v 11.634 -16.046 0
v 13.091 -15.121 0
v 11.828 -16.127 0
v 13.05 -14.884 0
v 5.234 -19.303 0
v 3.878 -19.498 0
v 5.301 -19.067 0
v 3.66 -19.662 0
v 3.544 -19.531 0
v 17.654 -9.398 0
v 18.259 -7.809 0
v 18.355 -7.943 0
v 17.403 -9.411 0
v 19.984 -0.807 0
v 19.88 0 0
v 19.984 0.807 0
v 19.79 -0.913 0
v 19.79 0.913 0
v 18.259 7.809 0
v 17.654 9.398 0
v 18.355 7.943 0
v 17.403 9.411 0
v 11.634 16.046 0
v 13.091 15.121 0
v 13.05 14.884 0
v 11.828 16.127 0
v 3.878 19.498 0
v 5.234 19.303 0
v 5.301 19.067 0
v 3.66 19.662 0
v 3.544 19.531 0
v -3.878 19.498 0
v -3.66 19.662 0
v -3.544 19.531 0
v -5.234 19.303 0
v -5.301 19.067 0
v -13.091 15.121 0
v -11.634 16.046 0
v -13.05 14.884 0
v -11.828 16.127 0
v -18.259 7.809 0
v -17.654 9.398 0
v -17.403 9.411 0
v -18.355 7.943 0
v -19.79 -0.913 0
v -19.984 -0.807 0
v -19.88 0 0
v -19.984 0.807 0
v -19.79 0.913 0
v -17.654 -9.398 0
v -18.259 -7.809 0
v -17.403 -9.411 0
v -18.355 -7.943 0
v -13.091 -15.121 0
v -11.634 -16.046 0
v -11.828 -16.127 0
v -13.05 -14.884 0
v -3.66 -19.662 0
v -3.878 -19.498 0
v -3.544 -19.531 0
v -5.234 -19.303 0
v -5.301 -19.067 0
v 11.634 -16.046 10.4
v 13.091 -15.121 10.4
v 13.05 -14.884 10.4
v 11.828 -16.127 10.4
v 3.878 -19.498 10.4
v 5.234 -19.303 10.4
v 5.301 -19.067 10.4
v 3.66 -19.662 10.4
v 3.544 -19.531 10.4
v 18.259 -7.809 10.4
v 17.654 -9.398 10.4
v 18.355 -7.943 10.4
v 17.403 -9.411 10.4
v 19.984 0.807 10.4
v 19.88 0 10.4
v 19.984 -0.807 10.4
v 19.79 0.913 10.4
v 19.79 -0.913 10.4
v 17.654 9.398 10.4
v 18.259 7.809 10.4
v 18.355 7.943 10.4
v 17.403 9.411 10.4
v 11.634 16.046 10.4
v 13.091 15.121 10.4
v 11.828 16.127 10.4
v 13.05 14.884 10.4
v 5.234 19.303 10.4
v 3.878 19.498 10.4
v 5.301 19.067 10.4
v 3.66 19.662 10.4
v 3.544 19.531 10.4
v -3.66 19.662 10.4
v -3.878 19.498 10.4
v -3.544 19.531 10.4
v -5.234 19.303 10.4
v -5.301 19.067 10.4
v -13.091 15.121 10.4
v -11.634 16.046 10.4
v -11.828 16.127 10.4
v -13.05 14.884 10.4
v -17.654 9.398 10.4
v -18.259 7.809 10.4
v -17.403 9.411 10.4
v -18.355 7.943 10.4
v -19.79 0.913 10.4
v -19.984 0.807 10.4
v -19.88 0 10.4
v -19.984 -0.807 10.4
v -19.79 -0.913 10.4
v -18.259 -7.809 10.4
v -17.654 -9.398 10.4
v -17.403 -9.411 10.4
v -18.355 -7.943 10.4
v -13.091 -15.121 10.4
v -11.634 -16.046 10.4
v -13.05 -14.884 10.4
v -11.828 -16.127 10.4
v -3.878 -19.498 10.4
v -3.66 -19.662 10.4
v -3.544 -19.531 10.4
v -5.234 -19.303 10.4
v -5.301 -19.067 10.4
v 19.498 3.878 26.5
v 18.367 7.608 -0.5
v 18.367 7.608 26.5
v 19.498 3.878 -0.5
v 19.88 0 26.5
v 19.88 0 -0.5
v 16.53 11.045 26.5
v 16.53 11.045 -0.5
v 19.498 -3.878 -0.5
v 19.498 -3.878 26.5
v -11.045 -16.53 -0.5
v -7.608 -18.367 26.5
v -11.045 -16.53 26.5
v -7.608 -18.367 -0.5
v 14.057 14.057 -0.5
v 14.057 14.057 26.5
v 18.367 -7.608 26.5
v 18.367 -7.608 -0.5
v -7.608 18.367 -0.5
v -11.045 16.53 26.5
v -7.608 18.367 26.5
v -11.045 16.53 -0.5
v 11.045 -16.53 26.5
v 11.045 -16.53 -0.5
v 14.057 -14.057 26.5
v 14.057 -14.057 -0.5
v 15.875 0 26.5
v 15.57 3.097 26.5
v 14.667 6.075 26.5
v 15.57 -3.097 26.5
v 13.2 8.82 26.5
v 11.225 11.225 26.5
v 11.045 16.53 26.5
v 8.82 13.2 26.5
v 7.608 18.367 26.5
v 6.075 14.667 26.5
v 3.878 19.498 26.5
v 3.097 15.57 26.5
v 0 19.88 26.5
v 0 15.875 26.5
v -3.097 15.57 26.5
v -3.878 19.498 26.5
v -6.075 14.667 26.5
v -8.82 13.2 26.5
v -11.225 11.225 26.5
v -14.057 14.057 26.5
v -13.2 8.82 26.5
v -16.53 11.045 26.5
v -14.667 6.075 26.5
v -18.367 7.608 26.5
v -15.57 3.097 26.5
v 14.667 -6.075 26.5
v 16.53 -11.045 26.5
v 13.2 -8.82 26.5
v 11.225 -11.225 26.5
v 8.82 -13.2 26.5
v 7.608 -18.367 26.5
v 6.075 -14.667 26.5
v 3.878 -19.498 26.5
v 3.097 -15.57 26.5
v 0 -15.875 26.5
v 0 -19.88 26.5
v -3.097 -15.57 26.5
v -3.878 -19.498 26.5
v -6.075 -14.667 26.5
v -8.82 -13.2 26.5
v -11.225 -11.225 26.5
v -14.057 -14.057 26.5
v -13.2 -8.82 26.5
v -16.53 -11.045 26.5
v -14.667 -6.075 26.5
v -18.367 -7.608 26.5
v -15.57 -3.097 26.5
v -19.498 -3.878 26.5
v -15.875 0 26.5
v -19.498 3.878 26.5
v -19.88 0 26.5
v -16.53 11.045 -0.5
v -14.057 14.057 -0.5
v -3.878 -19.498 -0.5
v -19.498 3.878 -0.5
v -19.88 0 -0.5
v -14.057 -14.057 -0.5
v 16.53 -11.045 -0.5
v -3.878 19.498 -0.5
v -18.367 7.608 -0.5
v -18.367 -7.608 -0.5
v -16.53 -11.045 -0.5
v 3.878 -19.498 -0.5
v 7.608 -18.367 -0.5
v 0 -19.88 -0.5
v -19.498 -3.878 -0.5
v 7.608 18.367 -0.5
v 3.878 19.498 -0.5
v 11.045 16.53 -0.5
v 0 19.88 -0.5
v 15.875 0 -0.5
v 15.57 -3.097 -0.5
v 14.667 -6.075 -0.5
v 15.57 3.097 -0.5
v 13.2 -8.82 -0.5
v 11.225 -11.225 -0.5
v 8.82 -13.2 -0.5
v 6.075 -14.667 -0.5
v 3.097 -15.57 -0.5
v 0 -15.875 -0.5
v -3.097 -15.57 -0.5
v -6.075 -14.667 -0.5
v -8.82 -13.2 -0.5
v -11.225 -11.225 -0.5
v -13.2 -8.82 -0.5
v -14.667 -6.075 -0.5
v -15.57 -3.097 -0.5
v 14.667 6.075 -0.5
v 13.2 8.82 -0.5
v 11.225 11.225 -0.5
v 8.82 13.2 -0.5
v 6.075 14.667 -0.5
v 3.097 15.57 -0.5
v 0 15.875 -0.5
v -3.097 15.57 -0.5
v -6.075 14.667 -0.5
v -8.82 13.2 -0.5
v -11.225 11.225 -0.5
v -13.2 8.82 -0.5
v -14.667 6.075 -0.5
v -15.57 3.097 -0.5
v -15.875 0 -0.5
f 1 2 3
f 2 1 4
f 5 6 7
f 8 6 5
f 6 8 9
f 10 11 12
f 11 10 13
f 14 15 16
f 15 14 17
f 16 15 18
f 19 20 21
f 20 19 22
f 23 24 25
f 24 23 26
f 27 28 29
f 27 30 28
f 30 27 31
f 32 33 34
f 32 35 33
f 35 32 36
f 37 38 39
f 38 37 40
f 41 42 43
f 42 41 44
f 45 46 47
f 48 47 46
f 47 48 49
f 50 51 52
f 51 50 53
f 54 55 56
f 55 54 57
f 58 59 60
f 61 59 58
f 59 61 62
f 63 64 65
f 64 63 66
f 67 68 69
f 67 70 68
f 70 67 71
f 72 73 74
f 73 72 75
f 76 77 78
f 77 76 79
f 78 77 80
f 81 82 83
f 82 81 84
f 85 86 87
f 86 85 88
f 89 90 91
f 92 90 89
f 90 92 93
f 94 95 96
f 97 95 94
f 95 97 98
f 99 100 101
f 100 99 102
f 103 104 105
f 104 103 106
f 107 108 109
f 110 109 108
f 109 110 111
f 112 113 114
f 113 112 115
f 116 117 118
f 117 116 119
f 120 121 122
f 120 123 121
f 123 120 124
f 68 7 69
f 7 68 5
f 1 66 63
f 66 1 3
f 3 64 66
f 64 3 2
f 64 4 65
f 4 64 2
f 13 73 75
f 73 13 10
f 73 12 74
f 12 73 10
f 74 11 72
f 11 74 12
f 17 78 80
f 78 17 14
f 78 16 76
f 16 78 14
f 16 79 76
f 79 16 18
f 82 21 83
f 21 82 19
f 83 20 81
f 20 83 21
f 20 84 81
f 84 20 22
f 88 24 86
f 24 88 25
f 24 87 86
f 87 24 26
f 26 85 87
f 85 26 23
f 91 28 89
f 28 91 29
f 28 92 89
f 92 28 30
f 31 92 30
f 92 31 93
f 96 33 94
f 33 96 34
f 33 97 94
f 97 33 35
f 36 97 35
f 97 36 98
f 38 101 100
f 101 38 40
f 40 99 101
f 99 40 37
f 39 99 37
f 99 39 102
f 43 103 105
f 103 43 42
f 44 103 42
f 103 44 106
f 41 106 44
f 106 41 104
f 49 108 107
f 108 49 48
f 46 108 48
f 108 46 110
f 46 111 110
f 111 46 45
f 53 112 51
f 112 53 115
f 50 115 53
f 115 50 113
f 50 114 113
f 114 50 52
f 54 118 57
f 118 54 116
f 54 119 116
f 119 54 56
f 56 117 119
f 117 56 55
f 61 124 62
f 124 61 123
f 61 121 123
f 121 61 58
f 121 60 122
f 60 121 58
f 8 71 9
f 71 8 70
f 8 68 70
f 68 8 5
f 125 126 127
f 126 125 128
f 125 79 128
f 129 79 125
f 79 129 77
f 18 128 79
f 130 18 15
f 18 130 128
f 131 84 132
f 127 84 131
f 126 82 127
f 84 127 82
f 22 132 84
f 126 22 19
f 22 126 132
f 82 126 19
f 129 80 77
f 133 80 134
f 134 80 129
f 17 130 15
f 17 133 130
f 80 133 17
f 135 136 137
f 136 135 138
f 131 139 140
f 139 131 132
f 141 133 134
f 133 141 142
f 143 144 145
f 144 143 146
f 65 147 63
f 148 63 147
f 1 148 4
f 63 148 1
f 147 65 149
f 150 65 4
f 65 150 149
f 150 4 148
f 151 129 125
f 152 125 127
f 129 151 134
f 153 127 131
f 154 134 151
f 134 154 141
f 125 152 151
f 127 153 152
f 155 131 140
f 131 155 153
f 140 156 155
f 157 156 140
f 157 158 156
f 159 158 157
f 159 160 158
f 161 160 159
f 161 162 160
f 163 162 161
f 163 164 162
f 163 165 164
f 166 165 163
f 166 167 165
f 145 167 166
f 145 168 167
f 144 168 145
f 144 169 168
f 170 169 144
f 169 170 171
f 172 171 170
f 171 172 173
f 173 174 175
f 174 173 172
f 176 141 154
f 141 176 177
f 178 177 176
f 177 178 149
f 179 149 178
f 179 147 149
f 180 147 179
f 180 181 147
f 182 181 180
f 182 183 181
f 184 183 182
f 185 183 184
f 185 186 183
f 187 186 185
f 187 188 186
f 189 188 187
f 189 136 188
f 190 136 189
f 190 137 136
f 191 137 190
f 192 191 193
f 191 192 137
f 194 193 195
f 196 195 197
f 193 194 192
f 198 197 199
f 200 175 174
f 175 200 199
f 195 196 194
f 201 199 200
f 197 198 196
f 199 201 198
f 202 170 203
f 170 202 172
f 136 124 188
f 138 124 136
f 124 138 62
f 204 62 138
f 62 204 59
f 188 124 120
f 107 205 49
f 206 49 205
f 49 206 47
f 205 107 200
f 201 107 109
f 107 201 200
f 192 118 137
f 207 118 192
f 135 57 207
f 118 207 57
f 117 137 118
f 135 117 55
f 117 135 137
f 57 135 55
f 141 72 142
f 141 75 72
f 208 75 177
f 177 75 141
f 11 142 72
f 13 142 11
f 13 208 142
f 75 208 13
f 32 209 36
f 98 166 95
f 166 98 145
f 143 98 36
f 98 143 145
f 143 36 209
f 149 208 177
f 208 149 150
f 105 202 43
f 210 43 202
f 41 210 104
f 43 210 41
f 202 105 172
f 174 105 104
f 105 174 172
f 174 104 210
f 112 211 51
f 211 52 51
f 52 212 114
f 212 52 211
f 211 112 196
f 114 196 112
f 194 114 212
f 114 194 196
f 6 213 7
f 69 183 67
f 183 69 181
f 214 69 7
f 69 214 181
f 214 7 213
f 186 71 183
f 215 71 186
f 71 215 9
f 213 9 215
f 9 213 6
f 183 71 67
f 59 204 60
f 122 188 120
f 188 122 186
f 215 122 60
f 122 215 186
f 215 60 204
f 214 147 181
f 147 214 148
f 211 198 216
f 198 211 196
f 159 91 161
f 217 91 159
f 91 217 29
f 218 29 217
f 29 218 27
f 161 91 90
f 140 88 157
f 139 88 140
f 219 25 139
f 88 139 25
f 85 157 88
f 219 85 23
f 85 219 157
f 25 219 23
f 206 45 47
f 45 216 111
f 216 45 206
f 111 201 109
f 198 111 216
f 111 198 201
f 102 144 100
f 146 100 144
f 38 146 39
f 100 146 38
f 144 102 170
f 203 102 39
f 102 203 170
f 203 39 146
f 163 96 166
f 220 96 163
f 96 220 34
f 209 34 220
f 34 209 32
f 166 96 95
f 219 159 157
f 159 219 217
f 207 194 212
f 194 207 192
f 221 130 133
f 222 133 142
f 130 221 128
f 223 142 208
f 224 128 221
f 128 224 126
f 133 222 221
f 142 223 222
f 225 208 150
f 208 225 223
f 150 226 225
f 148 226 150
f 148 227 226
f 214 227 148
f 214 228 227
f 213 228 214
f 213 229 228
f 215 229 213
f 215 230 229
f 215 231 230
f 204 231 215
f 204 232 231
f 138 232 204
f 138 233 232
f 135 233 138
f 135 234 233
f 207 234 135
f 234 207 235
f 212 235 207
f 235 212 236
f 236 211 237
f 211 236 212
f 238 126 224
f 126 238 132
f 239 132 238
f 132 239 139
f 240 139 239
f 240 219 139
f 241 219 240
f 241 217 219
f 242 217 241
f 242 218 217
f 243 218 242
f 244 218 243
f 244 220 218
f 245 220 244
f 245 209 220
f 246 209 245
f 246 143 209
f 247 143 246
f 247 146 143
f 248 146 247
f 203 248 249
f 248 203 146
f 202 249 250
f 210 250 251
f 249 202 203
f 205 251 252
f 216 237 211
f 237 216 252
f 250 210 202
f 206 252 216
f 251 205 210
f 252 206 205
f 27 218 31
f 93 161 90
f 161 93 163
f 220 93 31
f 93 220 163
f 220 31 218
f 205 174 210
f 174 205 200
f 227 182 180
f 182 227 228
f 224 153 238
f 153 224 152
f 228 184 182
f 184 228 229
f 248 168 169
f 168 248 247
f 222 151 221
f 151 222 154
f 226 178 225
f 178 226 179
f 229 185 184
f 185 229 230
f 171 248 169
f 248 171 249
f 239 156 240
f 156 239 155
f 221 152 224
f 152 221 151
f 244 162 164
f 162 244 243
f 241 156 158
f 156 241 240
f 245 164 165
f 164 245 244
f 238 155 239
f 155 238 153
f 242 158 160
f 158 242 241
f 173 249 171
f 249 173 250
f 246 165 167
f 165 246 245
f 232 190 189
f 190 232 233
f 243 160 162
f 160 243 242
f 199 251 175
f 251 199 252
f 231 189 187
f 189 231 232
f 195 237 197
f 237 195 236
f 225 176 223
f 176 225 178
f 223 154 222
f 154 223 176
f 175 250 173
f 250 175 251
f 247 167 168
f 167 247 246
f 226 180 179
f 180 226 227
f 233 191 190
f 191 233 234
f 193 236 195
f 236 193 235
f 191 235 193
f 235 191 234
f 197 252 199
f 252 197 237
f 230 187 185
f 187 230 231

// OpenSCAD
$fn = 32;

// ----------------------------------------------------------------------
// Two-module gear rim: z14 m2.5 and z18 m1.5, 26 mm wide
// ----------------------------------------------------------------------

// --- parameters (mm) ---
module_a = 2.5;           // first tooth module
teeth_a = 14;             // first band tooth count
module_b = 1.5;           // second tooth module
teeth_b = 18;             // second band tooth count
band_h = 10;              // height of one tooth band
web_t = 6;                // web thickness between the bands
total = 26;               // overall width over both bands
root_r = 14.38;           // root radius of the coarse band
hub_r = 19.88;            // hub radius
bore_d = 31.75;           // hub bore
hole_count = 4;           // lightening holes
hole_r = 10.94;           // lightening hole circle radius
hole_d = 4;               // lightening hole diameter

band_a = [[14.259, -1.82], [17.559, -1.916], [18.774, -1.469], [19.984, -0.807], [19.984, 0.807], [18.774, 1.469], [17.559, 1.916], [14.259, 1.82], [13.637, 4.547], [16.651, 5.892], [17.552, 6.823], [18.355, 7.943], [17.654, 9.398], [16.278, 9.469], [14.989, 9.345], [12.058, 7.827], [10.313, 10.014], [12.446, 12.533], [12.854, 13.763], [13.091, 15.121], [11.828, 16.127], [10.557, 15.594], [9.45, 14.923], [7.468, 12.283], [4.947, 13.497], [5.775, 16.692], [5.609, 17.977], [5.234, 19.303], [3.66, 19.662], [2.746, 18.63], [2.039, 17.545], [1.399, 14.307], [-1.399, 14.307], [-2.039, 17.545], [-2.746, 18.63], [-3.66, 19.662], [-5.234, 19.303], [-5.609, 17.977], [-5.775, 16.692], [-4.947, 13.497], [-7.468, 12.283], [-9.45, 14.923], [-10.557, 15.594], [-11.828, 16.127], [-13.091, 15.121], [-12.854, 13.763], [-12.446, 12.533], [-10.313, 10.014], [-12.058, 7.827], [-14.989, 9.345], [-16.278, 9.469], [-17.654, 9.398], [-18.355, 7.943], [-17.552, 6.823], [-16.651, 5.892], [-13.637, 4.547], [-14.259, 1.82], [-17.559, 1.916], [-18.774, 1.469], [-19.984, 0.807], [-19.984, -0.807], [-18.774, -1.469], [-17.559, -1.916], [-14.259, -1.82], [-13.637, -4.547], [-16.651, -5.892], [-17.552, -6.823], [-18.355, -7.943], [-17.654, -9.398], [-16.278, -9.469], [-14.989, -9.345], [-12.058, -7.827], [-10.313, -10.014], [-12.446, -12.533], [-12.854, -13.763], [-13.091, -15.121], [-11.828, -16.127], [-10.557, -15.594], [-9.45, -14.923], [-7.468, -12.283], [-4.947, -13.497], [-5.775, -16.692], [-5.609, -17.977], [-5.234, -19.303], [-3.66, -19.662], [-2.746, -18.63], [-2.039, -17.545], [-1.399, -14.307], [1.399, -14.307], [2.039, -17.545], [2.746, -18.63], [3.66, -19.662], [5.234, -19.303], [5.609, -17.977], [5.775, -16.692], [4.947, -13.497], [7.468, -12.283], [9.45, -14.923], [10.557, -15.594], [11.828, -16.127], [13.091, -15.121], [12.854, -13.763], [12.446, -12.533], [10.313, -10.014], [12.058, -7.827], [14.989, -9.345], [16.278, -9.469], [17.654, -9.398], [18.355, -7.943], [17.552, -6.823], [16.651, -5.892], [13.637, -4.547]];
band_b = [[11.565, -1.183], [13.439, -1.179], [14.216, -0.906], [14.991, -0.511], [14.991, 0.511], [14.216, 0.906], [13.439, 1.179], [11.565, 1.183], [11.272, 2.844], [13.032, 3.488], [13.669, 4.011], [14.262, 4.647], [13.912, 5.608], [13.049, 5.713], [12.225, 5.704], [10.463, 5.067], [9.619, 6.527], [11.053, 7.735], [11.473, 8.444], [11.813, 9.245], [11.155, 10.028], [10.308, 9.832], [9.537, 9.542], [8.099, 8.34], [6.807, 9.424], [7.741, 11.049], [7.892, 11.859], [7.938, 12.727], [7.053, 13.238], [6.324, 12.765], [5.698, 12.228], [4.758, 10.607], [3.173, 11.184], [3.495, 13.03], [3.36, 13.843], [3.107, 14.675], [2.1, 14.852], [1.577, 14.158], [1.172, 13.44], [0.843, 11.594], [-0.843, 11.594], [-1.172, 13.44], [-1.577, 14.158], [-2.1, 14.852], [-3.107, 14.675], [-3.36, 13.843], [-3.495, 13.03], [-3.173, 11.184], [-4.758, 10.607], [-5.698, 12.228], [-6.324, 12.765], [-7.053, 13.238], [-7.938, 12.727], [-7.892, 11.859], [-7.741, 11.049], [-6.807, 9.424], [-8.099, 8.34], [-9.537, 9.542], [-10.308, 9.832], [-11.155, 10.028], [-11.813, 9.245], [-11.473, 8.444], [-11.053, 7.735], [-9.619, 6.527], [-10.463, 5.067], [-12.225, 5.704], [-13.049, 5.713], [-13.912, 5.608], [-14.262, 4.647], [-13.669, 4.011], [-13.032, 3.488], [-11.272, 2.844], [-11.565, 1.183], [-13.439, 1.179], [-14.216, 0.906], [-14.991, 0.511], [-14.991, -0.511], [-14.216, -0.906], [-13.439, -1.179], [-11.565, -1.183], [-11.272, -2.844], [-13.032, -3.488], [-13.669, -4.011], [-14.262, -4.647], [-13.912, -5.608], [-13.049, -5.713], [-12.225, -5.704], [-10.463, -5.067], [-9.619, -6.527], [-11.053, -7.735], [-11.473, -8.444], [-11.813, -9.245], [-11.155, -10.028], [-10.308, -9.832], [-9.537, -9.542], [-8.099, -8.34], [-6.807, -9.424], [-7.741, -11.049], [-7.892, -11.859], [-7.938, -12.727], [-7.053, -13.238], [-6.324, -12.765], [-5.698, -12.228], [-4.758, -10.607], [-3.173, -11.184], [-3.495, -13.03], [-3.36, -13.843], [-3.107, -14.675], [-2.1, -14.852], [-1.577, -14.158], [-1.172, -13.44], [-0.843, -11.594], [0.843, -11.594], [1.172, -13.44], [1.577, -14.158], [2.1, -14.852], [3.107, -14.675], [3.36, -13.843], [3.495, -13.03], [3.173, -11.184], [4.758, -10.607], [5.698, -12.228], [6.324, -12.765], [7.053, -13.238], [7.938, -12.727], [7.892, -11.859], [7.741, -11.049], [6.807, -9.424], [8.099, -8.34], [9.537, -9.542], [10.308, -9.832], [11.155, -10.028], [11.813, -9.245], [11.473, -8.444], [11.053, -7.735], [9.619, -6.527], [10.463, -5.067], [12.225, -5.704], [13.049, -5.713], [13.912, -5.608], [14.262, -4.647], [13.669, -4.011], [13.032, -3.488], [11.272, -2.844]];

difference() {
  union() {
    /* tooth band A, overlapping the web by 0.4 mm */
    linear_extrude(height = band_h + 0.4) polygon(band_a);
    /* web */
    translate([0, 0, band_h - 0.4]) cylinder(h = web_t + 0.8, d = 2 * root_r);
    /* tooth band B */
    translate([0, 0, band_h + web_t]) linear_extrude(height = band_h + 0.4) polygon(band_b);
    /* hub */
    translate([0, 0, -0.5]) cylinder(h = total + 1.0, d = 2 * hub_r);
  }
  /* bore */
  translate([0, 0, -2.5]) cylinder(h = total + 5, d = bore_d);
  /* lightening holes through the web */
  for (i = [0 : hole_count - 1]) {
    a = i * 360 / hole_count;
    translate([hole_r * cos(a), hole_r * sin(a), -2.5]) cylinder(h = total + 5, d = hole_d);
  }
}
